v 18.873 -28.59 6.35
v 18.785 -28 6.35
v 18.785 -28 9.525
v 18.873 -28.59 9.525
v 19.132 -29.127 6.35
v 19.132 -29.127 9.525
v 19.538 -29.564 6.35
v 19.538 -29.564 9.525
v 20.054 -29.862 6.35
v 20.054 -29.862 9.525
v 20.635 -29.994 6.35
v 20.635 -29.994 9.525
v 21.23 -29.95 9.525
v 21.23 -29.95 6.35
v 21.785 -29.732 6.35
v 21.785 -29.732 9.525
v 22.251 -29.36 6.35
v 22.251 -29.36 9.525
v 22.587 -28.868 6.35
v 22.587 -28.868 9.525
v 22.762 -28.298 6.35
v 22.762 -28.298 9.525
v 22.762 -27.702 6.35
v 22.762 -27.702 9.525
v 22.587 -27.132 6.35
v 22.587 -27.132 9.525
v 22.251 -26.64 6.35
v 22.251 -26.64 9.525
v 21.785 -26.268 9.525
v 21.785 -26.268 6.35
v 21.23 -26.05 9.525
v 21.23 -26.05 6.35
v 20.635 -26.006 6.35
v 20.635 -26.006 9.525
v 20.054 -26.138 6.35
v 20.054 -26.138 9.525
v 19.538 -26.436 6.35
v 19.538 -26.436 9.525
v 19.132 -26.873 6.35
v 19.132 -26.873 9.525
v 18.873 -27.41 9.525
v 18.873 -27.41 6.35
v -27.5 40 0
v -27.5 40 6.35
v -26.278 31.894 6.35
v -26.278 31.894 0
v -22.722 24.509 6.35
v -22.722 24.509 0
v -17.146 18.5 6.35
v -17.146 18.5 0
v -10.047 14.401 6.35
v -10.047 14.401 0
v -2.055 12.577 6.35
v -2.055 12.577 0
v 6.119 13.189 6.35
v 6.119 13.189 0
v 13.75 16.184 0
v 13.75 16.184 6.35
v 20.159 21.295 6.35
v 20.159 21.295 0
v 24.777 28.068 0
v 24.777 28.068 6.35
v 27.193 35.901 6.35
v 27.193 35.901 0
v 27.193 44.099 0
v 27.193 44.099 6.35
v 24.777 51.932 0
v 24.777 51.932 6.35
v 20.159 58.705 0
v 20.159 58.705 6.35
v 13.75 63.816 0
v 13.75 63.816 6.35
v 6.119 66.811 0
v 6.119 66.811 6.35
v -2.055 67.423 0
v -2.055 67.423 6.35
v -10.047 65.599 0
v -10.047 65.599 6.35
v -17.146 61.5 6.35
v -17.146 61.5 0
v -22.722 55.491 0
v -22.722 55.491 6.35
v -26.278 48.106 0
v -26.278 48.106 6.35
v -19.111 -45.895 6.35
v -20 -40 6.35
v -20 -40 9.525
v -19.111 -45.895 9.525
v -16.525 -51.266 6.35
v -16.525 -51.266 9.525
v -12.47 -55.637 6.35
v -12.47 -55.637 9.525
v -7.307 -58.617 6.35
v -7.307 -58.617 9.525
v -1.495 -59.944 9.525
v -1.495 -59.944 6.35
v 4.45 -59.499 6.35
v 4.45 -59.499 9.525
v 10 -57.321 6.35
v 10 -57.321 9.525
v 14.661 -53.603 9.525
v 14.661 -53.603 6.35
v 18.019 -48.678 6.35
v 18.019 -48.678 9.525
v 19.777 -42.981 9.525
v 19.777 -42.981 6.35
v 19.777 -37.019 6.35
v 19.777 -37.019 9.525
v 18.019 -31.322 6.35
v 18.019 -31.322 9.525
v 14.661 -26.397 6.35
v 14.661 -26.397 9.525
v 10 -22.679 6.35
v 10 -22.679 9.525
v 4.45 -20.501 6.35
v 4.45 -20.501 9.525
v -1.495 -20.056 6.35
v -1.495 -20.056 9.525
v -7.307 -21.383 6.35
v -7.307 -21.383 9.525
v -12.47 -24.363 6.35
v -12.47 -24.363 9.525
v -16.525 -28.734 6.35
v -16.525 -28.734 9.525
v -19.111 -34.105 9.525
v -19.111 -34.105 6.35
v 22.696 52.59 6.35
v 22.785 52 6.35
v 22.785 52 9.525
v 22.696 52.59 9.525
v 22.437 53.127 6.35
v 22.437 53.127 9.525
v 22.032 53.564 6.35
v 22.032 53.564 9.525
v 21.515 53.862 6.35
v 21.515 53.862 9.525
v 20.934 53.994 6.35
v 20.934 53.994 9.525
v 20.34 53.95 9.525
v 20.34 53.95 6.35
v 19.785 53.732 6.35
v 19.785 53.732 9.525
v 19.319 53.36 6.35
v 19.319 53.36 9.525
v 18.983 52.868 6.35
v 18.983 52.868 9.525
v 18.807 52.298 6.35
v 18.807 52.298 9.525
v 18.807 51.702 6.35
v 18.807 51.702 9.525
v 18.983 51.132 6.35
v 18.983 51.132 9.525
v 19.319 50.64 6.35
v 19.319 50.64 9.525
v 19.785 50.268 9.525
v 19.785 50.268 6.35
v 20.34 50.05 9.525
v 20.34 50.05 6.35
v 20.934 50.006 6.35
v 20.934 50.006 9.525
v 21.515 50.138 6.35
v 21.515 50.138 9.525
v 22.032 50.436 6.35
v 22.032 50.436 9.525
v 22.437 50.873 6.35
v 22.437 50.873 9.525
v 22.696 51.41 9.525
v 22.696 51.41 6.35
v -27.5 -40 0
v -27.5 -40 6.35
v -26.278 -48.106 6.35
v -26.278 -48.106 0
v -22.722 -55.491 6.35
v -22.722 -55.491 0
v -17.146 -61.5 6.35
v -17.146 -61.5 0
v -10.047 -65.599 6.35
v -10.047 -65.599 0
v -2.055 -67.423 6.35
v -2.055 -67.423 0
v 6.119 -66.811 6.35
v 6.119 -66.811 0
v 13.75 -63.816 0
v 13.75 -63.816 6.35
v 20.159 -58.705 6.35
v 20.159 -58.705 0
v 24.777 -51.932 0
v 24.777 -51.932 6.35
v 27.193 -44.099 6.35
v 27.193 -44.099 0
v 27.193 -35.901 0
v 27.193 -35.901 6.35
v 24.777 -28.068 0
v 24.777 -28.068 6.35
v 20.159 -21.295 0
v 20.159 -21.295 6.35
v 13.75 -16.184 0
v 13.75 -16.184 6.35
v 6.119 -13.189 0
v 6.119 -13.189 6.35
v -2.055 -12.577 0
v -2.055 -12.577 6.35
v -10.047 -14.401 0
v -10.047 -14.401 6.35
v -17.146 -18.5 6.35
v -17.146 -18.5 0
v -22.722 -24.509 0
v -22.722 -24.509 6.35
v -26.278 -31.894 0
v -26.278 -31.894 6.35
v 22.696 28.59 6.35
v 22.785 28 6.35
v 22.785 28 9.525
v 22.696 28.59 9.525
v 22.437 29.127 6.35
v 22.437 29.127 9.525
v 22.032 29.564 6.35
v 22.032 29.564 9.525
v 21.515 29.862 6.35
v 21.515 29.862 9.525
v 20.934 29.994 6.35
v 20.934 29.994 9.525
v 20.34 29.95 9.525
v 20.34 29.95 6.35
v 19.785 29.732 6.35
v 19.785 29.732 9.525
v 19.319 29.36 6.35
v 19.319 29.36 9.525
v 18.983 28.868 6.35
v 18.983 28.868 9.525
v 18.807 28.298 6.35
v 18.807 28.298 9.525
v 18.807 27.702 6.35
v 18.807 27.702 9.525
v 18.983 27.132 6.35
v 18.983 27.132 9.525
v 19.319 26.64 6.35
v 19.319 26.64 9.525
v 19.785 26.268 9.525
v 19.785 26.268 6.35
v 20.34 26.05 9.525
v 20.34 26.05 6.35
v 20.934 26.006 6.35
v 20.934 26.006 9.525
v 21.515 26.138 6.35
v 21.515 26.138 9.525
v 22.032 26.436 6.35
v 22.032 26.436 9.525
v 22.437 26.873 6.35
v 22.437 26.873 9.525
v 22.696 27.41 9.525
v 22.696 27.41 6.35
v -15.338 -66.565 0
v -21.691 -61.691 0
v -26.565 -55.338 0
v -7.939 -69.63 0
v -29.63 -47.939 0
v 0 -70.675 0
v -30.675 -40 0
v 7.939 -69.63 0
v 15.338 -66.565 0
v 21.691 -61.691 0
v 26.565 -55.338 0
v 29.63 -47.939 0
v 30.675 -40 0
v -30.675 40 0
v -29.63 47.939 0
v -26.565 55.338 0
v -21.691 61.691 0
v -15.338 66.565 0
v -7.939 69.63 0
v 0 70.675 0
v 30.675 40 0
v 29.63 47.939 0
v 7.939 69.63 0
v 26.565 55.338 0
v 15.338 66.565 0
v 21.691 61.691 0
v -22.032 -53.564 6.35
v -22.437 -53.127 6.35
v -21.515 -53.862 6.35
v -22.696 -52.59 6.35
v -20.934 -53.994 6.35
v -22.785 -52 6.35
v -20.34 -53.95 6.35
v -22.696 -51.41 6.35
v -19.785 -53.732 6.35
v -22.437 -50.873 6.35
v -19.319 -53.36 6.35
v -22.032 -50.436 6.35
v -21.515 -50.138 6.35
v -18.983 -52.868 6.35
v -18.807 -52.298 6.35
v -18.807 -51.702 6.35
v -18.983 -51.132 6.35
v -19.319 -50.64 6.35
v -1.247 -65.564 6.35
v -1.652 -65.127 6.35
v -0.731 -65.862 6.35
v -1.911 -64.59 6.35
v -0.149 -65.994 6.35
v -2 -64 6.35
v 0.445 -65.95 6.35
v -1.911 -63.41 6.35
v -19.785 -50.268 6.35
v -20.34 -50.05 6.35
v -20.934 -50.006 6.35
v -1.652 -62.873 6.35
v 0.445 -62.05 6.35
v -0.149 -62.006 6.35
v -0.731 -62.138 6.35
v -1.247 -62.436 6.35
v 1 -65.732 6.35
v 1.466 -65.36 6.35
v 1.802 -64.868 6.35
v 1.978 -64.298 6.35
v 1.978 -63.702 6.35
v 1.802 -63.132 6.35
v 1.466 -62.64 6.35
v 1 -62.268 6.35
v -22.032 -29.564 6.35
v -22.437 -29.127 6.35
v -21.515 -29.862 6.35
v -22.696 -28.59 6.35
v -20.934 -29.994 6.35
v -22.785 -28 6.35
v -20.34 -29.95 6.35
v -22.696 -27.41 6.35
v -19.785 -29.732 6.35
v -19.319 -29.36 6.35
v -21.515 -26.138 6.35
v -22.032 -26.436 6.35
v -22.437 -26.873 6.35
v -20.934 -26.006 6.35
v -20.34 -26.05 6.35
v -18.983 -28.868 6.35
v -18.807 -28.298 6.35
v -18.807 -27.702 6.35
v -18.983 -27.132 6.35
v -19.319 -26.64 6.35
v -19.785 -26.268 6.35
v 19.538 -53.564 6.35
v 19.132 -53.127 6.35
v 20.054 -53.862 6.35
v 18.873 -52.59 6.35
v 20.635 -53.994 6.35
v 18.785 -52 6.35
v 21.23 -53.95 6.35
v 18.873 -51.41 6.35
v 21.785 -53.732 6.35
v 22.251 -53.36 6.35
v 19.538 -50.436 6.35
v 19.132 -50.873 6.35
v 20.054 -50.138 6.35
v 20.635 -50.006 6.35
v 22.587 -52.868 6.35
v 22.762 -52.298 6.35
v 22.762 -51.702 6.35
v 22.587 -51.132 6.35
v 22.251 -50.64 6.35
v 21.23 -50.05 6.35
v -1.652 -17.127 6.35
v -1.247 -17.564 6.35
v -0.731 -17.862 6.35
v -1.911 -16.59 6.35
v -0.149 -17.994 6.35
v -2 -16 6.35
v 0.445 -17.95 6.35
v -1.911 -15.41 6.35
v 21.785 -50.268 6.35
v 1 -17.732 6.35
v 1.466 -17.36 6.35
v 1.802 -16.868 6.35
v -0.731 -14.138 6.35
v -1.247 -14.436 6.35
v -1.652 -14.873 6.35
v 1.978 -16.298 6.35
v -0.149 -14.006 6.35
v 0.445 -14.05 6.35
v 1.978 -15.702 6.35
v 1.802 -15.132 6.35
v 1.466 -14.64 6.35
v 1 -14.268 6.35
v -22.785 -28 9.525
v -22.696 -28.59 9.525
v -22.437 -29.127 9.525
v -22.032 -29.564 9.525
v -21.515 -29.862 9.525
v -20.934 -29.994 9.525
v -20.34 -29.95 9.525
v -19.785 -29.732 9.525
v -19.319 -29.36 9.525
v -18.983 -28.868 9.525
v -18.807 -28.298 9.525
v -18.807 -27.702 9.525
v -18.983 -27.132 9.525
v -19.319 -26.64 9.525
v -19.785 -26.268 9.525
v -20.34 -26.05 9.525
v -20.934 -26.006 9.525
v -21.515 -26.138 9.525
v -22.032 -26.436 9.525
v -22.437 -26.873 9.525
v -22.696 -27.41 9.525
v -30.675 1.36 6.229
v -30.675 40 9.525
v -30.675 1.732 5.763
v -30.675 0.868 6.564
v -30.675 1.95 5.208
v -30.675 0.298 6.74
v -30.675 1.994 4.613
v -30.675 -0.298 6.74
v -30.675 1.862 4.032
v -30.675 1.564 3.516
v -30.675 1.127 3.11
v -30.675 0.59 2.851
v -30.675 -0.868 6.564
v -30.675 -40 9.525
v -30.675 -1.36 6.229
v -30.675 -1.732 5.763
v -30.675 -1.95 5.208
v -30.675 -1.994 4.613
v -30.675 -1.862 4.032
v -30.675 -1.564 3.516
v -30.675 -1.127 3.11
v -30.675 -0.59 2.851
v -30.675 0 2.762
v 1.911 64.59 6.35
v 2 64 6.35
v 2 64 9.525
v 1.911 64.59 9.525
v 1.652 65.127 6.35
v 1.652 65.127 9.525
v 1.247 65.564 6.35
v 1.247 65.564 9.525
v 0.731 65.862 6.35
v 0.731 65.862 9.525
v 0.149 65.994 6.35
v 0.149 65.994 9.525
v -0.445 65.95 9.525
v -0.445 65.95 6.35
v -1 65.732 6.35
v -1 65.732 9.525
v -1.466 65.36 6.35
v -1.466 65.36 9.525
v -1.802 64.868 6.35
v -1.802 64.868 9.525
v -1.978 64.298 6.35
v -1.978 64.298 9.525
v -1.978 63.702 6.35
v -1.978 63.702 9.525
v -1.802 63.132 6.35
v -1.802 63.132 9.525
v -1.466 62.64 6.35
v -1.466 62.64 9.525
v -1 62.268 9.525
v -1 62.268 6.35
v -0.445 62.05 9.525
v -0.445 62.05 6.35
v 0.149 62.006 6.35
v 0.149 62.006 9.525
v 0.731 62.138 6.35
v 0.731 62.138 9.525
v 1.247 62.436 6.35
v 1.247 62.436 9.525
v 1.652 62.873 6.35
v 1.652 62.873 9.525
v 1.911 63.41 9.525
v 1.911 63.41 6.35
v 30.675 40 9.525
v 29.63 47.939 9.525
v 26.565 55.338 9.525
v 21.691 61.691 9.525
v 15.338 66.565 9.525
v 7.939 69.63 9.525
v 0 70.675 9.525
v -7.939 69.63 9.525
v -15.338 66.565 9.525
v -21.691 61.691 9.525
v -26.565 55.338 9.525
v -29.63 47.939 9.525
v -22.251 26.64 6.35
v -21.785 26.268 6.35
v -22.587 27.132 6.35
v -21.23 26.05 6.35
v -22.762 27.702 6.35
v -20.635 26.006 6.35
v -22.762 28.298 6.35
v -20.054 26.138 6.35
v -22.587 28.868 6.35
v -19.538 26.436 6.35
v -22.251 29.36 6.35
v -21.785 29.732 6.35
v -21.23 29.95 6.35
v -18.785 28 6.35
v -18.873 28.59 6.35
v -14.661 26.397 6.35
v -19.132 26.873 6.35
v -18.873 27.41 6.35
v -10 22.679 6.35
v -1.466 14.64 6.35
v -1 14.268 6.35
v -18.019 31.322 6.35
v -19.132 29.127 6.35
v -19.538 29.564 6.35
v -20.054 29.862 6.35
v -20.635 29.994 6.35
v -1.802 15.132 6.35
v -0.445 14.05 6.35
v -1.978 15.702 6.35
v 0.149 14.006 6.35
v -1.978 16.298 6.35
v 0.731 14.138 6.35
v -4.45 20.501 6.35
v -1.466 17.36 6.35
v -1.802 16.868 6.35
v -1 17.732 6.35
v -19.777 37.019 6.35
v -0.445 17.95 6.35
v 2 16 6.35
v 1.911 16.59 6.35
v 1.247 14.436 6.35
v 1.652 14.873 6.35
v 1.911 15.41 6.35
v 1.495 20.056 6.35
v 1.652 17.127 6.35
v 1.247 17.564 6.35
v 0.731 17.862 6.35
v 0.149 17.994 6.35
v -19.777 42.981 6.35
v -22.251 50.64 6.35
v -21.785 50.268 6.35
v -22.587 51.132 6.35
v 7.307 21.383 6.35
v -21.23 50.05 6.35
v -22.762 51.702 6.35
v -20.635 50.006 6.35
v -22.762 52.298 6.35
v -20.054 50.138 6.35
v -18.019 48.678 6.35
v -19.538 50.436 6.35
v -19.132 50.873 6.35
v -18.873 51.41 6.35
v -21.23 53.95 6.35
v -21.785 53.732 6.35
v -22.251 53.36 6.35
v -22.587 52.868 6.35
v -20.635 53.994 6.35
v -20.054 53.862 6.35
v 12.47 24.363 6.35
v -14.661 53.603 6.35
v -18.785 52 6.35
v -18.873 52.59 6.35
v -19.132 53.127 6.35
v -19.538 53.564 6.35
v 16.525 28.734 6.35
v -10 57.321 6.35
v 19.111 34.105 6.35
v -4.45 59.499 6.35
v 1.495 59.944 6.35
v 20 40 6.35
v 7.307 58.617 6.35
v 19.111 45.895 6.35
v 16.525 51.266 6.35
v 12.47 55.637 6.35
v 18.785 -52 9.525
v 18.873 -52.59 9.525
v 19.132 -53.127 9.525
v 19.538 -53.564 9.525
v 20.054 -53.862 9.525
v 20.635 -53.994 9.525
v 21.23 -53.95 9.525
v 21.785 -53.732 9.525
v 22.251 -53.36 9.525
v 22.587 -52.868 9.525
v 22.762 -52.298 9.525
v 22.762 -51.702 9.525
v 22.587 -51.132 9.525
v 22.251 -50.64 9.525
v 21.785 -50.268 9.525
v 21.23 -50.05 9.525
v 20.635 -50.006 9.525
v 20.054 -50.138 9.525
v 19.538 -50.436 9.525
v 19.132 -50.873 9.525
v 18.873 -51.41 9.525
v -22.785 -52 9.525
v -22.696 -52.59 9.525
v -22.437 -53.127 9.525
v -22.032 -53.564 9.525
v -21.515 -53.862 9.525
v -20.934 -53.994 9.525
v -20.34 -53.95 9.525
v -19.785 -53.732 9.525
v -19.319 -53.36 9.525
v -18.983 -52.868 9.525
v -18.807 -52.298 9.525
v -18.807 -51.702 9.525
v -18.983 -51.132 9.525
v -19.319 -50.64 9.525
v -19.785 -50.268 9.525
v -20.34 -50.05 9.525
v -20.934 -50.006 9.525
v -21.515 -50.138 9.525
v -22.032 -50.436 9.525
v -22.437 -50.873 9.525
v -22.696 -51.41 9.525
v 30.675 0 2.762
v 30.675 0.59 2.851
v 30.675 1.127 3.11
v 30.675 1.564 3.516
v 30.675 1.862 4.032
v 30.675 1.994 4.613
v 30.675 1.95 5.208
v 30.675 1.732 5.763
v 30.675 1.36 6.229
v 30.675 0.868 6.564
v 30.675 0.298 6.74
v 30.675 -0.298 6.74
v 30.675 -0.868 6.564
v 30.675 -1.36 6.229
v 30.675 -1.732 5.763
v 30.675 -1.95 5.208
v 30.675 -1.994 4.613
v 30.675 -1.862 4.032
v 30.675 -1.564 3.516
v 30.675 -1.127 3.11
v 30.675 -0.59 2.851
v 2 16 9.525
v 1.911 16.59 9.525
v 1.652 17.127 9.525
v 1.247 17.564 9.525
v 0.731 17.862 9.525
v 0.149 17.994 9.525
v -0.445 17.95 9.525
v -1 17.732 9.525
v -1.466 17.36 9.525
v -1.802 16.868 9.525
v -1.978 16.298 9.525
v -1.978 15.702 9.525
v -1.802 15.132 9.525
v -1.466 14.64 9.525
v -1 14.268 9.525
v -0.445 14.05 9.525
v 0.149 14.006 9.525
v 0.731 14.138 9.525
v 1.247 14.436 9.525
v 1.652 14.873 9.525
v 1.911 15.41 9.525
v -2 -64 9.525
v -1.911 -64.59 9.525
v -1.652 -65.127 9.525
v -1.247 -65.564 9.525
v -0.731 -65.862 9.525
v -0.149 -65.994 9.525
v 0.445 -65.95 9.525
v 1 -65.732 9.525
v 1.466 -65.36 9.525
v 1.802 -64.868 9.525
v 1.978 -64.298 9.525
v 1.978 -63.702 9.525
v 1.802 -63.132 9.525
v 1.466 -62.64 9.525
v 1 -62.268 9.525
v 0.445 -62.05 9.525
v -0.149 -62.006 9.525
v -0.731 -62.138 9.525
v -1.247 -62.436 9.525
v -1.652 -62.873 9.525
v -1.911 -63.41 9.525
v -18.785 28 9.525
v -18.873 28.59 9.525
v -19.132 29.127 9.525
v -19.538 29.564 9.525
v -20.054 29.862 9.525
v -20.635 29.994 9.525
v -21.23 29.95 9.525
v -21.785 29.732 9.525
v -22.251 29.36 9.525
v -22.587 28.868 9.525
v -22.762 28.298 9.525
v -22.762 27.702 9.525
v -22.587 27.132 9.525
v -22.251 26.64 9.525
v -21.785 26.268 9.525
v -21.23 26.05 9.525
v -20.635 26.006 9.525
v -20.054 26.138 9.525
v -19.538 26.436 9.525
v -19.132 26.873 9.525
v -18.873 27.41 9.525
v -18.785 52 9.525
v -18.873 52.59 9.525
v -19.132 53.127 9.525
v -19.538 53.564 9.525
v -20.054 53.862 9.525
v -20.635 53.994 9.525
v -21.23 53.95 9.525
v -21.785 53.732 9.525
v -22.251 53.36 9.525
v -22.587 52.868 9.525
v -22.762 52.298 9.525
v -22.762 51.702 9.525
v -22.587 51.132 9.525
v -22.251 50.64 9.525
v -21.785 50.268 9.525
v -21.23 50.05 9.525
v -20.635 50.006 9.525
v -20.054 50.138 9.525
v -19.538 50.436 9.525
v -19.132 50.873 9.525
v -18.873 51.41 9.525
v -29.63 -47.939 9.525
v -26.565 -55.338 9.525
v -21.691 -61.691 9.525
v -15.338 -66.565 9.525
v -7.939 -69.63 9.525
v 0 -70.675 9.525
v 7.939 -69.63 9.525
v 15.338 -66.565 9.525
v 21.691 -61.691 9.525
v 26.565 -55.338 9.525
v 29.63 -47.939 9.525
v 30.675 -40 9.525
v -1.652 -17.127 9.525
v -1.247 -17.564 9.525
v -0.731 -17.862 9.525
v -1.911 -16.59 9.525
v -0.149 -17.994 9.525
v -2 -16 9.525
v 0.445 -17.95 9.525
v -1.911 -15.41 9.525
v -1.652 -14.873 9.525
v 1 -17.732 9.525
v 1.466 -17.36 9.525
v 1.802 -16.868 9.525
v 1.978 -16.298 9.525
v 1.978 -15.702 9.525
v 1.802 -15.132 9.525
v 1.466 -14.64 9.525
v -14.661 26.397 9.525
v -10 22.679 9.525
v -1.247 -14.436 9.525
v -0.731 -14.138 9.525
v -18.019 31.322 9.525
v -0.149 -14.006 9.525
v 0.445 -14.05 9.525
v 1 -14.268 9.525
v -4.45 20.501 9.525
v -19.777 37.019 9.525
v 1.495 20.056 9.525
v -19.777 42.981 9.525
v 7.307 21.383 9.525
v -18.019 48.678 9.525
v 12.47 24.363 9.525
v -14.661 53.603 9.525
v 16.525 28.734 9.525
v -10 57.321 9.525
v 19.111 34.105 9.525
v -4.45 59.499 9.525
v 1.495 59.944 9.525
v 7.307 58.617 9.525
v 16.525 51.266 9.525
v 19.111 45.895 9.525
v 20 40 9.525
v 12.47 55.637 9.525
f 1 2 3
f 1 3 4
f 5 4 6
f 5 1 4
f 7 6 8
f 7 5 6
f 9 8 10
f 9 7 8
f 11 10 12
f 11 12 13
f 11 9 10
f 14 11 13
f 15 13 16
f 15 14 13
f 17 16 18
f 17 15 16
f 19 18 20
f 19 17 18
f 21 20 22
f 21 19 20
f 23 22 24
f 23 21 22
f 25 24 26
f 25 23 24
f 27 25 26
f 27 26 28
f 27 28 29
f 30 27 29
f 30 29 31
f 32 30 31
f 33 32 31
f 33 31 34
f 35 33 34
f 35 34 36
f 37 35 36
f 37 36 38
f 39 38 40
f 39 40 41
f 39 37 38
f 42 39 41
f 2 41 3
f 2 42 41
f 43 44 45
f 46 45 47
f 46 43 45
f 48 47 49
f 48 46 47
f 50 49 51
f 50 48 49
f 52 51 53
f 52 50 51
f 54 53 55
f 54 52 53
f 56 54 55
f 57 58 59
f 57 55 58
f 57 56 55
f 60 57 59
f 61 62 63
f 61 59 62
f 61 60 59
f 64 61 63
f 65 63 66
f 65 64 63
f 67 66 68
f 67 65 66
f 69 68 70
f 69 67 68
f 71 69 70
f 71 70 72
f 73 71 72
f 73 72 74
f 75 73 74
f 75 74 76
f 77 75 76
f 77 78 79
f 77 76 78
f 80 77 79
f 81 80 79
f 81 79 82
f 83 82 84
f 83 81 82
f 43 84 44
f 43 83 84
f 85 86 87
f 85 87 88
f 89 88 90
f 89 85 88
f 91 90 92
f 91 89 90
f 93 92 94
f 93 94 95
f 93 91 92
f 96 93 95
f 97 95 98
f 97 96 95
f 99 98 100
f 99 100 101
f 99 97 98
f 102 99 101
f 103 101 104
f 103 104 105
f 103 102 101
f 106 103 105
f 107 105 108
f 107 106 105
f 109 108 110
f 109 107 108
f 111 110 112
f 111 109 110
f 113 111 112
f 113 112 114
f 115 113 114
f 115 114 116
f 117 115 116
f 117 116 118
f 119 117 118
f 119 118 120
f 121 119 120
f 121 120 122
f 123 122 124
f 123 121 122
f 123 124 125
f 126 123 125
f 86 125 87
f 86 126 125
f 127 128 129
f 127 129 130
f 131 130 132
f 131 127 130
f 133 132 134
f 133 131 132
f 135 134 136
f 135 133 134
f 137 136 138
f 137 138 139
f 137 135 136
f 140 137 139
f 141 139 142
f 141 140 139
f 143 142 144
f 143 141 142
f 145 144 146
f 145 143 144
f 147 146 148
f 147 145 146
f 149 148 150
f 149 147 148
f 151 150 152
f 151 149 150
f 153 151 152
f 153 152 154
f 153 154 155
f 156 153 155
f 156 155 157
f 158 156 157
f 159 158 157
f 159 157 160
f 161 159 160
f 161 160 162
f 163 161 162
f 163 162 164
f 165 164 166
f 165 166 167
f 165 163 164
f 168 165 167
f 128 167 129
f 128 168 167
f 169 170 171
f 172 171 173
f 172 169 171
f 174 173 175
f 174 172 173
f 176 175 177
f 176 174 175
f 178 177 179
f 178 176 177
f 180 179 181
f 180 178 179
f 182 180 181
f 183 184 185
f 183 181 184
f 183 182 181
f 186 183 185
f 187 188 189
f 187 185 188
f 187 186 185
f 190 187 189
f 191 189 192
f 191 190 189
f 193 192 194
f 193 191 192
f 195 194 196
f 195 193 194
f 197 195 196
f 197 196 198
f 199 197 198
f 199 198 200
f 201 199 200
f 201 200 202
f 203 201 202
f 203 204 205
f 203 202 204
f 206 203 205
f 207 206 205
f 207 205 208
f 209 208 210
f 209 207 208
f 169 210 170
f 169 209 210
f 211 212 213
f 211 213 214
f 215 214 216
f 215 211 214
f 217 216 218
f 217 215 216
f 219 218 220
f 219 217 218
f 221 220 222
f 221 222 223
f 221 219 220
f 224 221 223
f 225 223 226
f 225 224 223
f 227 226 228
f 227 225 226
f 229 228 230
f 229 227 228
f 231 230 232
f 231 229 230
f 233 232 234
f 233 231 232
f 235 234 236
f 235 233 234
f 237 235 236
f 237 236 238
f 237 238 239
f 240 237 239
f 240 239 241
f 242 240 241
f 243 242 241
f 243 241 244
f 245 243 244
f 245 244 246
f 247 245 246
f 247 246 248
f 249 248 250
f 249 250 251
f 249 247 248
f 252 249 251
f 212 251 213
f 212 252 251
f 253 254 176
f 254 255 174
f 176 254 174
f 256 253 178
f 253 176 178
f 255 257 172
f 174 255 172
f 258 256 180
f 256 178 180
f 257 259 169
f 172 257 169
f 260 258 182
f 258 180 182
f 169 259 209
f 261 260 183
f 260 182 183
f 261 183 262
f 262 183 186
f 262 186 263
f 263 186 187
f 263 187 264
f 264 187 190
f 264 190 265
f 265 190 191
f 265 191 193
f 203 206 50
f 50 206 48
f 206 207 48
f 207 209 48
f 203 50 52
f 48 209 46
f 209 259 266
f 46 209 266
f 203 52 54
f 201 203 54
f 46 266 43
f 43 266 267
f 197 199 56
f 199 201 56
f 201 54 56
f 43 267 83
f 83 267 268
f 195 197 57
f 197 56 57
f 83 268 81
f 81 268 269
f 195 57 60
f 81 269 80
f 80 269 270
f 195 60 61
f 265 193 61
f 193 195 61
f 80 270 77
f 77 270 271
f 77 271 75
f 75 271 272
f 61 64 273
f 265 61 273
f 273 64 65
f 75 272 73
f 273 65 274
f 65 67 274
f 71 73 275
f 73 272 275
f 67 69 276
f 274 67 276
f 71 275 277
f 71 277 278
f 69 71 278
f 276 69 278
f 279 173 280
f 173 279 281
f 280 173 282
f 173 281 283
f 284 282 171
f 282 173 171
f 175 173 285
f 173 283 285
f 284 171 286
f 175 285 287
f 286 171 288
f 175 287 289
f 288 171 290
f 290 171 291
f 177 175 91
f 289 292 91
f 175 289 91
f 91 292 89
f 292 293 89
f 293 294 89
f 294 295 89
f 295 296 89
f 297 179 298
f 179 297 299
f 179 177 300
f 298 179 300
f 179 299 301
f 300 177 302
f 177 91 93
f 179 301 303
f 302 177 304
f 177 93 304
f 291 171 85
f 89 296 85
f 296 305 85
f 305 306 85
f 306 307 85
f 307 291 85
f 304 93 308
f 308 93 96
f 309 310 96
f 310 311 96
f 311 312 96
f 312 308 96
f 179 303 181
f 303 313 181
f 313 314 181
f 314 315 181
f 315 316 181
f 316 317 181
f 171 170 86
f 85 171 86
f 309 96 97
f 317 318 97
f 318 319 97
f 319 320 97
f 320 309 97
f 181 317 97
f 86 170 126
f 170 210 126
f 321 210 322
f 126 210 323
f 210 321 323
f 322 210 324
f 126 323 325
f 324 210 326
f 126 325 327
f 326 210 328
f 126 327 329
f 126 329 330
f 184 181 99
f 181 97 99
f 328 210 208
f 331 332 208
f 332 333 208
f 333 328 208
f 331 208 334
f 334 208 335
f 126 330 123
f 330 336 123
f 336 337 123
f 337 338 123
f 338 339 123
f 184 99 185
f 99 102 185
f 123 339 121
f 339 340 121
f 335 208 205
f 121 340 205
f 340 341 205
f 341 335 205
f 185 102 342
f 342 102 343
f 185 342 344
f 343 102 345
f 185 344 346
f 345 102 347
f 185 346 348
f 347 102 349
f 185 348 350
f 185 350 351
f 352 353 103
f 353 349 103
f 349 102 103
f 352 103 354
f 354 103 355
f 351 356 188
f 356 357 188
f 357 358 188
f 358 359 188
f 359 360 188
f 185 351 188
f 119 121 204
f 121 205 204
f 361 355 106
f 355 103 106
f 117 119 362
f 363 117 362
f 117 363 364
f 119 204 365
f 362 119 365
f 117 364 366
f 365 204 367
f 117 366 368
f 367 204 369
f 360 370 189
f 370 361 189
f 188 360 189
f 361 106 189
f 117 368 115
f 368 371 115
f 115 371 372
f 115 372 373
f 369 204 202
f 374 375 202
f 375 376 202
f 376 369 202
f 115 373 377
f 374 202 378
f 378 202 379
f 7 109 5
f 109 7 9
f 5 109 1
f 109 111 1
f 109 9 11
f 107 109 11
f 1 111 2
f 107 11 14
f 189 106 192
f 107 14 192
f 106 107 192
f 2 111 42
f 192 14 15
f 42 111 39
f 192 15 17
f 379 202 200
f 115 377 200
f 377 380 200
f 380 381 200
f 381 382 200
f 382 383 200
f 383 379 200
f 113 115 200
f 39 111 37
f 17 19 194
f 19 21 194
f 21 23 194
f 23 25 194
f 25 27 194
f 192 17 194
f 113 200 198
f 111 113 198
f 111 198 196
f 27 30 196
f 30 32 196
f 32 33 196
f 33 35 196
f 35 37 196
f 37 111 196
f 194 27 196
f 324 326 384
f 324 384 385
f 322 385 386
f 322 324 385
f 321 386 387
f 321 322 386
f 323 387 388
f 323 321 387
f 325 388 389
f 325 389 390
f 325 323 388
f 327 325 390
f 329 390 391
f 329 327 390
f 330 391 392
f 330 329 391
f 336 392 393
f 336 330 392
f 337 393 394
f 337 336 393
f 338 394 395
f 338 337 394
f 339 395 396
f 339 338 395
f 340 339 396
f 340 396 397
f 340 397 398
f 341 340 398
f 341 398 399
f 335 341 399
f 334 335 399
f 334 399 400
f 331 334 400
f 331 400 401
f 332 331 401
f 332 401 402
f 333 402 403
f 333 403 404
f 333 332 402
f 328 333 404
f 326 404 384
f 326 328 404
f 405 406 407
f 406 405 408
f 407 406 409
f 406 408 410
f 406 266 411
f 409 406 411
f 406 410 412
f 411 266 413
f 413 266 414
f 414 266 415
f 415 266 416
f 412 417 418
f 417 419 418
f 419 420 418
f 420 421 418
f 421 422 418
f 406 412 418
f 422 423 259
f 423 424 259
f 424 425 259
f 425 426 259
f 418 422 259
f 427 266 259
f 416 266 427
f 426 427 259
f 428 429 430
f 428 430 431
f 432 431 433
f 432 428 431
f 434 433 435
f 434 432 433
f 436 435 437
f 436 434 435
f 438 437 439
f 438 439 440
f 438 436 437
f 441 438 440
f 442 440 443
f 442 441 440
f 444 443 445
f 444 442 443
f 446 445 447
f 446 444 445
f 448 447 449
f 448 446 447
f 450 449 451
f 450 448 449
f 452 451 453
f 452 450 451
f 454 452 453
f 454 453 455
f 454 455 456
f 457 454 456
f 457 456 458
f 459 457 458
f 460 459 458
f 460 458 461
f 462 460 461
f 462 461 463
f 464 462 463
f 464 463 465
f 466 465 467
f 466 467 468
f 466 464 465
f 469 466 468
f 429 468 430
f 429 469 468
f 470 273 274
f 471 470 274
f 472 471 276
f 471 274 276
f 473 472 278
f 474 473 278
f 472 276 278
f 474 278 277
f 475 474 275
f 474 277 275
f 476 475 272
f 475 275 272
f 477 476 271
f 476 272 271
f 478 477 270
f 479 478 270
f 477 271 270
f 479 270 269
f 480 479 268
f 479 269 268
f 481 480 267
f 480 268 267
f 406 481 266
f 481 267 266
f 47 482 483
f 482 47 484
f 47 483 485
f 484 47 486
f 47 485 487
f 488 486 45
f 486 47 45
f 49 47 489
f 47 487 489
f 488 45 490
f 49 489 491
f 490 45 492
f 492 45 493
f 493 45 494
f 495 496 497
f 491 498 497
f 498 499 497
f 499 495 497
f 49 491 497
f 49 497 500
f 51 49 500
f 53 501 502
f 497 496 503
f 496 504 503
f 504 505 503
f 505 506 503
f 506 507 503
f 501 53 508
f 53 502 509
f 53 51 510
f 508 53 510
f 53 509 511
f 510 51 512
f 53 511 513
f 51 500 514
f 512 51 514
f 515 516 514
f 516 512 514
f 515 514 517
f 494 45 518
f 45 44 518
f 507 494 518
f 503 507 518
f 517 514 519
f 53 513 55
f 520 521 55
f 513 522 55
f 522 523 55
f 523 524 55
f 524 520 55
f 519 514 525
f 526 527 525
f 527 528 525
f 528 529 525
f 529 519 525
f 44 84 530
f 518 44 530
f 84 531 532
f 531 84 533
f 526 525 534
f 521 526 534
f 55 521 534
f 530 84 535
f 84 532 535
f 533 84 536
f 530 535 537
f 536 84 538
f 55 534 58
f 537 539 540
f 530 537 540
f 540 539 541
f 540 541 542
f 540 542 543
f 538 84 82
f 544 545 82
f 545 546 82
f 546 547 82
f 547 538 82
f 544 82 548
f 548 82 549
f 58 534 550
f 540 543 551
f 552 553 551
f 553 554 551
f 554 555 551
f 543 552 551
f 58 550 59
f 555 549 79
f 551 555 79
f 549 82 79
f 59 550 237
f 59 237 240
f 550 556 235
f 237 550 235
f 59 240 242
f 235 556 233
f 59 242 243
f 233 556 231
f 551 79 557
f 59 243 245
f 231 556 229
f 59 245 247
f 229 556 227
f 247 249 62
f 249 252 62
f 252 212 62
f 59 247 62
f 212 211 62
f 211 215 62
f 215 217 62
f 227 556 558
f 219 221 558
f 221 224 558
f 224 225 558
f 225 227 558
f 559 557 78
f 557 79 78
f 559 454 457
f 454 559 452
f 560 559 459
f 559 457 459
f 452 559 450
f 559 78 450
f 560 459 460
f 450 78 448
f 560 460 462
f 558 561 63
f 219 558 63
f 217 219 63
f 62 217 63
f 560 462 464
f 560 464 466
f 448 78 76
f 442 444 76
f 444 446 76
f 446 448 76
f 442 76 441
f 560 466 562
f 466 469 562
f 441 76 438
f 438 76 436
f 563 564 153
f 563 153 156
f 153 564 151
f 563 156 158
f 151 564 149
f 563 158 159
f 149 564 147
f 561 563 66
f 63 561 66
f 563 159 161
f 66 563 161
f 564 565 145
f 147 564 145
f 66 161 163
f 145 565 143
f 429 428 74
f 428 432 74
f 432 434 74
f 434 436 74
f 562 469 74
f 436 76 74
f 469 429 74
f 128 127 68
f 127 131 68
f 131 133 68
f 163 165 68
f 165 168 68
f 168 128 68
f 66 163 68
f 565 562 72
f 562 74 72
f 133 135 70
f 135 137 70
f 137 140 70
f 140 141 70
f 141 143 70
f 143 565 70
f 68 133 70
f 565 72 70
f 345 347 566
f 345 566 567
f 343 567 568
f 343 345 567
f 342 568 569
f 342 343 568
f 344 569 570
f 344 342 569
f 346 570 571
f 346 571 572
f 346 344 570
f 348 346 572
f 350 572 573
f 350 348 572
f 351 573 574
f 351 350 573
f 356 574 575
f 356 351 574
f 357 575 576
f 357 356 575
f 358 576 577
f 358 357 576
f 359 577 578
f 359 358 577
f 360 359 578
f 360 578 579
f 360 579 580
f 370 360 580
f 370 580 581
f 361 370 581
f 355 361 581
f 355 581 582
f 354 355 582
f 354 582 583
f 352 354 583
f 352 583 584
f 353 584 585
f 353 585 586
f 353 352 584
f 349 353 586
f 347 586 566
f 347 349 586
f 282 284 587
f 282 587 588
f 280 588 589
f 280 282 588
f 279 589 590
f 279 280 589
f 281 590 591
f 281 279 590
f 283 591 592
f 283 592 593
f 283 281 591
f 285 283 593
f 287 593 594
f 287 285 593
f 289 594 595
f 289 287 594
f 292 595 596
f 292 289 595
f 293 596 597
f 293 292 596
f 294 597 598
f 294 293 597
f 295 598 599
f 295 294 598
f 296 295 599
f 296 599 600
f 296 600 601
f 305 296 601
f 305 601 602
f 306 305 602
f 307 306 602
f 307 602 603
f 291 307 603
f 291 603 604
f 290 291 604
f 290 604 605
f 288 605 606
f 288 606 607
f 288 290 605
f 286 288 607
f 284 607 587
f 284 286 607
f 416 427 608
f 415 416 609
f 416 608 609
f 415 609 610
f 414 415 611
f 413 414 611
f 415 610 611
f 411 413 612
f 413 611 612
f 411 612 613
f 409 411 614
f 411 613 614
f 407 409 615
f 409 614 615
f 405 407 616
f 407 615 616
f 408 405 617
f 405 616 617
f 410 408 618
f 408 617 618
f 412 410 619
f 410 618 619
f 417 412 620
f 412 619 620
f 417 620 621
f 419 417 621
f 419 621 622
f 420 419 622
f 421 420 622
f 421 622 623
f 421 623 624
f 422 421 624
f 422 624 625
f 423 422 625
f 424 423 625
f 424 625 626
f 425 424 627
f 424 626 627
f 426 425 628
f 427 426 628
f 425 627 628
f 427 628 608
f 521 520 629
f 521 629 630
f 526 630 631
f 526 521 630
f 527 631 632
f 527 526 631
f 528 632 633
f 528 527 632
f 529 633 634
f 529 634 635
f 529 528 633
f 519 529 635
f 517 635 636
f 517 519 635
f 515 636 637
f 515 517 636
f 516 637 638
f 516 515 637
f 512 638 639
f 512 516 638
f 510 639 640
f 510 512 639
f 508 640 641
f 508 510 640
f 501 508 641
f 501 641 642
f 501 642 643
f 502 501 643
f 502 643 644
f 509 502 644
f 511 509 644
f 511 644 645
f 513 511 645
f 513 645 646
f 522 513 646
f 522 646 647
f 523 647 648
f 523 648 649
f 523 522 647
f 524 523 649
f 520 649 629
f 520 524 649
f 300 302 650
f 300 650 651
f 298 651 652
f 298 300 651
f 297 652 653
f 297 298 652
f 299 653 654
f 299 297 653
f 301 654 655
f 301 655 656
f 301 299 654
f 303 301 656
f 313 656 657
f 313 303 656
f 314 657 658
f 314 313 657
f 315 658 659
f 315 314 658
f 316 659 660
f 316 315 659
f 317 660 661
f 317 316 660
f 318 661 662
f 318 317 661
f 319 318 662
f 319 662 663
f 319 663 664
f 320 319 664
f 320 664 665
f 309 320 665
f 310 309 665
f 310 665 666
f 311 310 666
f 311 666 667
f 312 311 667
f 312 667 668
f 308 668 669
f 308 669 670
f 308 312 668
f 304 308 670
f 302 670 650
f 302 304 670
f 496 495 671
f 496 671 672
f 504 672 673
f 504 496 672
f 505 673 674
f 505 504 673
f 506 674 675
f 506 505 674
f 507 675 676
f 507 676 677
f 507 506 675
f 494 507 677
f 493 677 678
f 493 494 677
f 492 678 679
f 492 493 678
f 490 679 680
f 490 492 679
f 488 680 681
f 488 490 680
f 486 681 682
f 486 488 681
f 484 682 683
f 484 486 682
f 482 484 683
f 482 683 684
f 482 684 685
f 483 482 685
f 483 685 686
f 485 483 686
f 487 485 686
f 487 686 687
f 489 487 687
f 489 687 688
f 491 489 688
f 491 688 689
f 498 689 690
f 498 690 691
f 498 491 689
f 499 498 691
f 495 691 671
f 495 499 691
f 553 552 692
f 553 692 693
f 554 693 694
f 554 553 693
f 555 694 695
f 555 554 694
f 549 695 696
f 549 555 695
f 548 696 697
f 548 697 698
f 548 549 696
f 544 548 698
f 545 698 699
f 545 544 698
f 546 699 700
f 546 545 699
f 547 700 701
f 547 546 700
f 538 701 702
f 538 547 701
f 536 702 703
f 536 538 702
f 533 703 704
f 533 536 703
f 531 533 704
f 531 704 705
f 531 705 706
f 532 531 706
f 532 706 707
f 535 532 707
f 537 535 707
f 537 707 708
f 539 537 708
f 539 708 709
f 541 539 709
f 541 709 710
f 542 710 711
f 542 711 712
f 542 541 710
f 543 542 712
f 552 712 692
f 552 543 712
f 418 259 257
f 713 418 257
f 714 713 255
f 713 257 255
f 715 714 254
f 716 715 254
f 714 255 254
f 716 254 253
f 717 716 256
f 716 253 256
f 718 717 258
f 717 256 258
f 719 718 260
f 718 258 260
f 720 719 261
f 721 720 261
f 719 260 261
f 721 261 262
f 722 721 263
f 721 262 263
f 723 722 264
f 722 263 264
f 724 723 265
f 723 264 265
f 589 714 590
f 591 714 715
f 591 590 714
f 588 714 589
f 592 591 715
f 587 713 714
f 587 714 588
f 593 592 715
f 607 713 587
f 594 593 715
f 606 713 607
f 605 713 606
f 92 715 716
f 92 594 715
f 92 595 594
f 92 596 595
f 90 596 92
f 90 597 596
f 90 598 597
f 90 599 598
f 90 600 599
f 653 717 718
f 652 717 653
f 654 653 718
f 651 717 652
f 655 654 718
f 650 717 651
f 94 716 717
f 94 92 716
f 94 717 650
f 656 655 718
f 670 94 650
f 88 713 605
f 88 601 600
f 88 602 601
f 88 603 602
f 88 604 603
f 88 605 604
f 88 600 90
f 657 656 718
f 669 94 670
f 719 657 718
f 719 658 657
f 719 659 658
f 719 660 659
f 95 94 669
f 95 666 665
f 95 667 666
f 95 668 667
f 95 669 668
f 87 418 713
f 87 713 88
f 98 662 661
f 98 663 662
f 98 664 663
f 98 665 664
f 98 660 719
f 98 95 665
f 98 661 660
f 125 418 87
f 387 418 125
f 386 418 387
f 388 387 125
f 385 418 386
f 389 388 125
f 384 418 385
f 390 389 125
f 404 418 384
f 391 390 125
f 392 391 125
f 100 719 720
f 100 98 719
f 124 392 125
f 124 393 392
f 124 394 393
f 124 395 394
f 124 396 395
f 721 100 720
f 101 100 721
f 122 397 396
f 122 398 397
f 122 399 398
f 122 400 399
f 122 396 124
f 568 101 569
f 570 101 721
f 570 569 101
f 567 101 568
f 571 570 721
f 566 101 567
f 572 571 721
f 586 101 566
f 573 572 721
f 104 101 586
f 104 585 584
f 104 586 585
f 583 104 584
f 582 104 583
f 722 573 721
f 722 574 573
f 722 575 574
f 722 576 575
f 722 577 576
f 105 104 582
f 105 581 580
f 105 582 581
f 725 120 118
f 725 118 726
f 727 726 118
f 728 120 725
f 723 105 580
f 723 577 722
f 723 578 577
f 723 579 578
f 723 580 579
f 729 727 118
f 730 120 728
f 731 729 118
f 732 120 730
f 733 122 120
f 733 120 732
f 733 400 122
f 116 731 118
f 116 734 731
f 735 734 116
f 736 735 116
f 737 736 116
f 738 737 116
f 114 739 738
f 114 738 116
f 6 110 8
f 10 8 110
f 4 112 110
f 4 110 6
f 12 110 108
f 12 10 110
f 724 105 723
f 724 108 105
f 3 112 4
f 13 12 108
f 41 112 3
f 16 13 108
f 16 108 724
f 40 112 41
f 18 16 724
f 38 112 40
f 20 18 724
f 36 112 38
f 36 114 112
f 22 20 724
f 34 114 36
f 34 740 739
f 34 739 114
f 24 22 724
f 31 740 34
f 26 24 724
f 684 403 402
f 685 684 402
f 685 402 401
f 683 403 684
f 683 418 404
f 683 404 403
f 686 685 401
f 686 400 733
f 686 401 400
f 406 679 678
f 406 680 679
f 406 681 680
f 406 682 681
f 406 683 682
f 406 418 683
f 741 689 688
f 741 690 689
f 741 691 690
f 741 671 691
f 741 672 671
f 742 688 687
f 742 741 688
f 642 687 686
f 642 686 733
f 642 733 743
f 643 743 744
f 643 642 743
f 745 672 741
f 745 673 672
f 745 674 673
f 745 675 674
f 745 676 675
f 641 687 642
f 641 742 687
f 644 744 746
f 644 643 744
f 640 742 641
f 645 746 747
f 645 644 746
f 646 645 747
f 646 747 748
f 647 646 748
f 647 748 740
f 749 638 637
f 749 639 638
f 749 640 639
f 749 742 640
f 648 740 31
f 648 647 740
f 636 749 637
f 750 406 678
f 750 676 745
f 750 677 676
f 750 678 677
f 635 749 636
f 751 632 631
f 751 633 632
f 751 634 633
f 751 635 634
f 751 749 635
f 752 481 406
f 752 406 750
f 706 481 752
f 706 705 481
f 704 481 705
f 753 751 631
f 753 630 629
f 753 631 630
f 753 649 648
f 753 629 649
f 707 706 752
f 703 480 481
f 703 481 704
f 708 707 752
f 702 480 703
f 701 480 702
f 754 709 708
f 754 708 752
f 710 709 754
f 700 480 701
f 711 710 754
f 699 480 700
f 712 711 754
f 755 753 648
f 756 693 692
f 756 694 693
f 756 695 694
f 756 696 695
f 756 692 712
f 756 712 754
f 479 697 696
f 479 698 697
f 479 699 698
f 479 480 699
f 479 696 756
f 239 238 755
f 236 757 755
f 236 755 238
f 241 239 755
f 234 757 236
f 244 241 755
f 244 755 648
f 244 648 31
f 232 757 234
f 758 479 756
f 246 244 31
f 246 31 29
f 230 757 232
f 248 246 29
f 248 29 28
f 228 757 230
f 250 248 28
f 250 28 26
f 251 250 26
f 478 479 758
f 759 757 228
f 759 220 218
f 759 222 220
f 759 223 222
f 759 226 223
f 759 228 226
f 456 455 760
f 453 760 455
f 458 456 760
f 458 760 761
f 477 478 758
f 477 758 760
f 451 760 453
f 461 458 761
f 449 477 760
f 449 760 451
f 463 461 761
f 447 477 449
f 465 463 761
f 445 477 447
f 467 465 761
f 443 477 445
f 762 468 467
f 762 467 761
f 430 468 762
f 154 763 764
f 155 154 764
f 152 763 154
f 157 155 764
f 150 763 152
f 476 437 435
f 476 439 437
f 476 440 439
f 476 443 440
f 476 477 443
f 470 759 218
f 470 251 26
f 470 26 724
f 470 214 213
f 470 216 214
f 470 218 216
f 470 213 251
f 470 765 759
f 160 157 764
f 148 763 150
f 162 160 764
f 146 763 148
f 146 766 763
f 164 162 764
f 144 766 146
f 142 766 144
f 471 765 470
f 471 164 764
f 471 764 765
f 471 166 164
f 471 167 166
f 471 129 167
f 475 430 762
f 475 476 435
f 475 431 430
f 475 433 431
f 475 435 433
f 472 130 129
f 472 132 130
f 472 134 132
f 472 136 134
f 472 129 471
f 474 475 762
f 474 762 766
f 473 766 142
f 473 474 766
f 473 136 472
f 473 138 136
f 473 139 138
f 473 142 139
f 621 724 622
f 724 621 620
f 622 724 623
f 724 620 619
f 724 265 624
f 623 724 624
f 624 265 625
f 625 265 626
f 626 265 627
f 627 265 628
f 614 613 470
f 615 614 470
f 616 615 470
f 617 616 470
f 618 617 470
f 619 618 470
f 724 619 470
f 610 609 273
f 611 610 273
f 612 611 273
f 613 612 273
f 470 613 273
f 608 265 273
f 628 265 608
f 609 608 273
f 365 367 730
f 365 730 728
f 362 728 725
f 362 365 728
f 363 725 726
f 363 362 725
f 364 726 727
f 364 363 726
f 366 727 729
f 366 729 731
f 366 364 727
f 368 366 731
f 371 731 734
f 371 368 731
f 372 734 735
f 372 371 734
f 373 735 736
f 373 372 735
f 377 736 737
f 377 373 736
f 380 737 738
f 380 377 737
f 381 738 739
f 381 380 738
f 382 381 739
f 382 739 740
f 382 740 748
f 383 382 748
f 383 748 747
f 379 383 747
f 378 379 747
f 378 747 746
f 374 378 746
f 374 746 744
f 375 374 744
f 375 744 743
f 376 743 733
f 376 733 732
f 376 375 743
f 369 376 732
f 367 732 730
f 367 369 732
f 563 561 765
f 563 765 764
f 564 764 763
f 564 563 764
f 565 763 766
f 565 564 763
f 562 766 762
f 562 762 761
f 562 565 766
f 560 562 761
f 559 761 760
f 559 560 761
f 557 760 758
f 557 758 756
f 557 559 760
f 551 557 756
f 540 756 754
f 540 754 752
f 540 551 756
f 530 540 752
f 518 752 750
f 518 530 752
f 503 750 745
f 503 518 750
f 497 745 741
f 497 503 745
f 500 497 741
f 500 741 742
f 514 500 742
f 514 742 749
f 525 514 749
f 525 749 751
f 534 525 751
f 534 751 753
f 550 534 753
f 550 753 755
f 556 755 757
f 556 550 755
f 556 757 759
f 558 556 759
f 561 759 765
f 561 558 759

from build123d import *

# Parameters (mm, degrees)
SKETCH1_R           = 27.5
BOSS_EXTRUDE1_DEPTH = 9.525
BOSS_EXTRUDE2_START = -3.175
SKETCH2_R           = 20
SKETCH2_R_2         = 2
BOSS_EXTRUDE2_DEPTH = 3.175
SKETCH8_R           = 2
CUT_EXTRUDE6_DEPTH  = 52.5


with BuildPart() as part:
    # Sketch1 → Boss-Extrude1 (new body)
    with BuildSketch(Plane.XY):
        with BuildLine():
            Line((-30.675000233, 40), (-30.675000233, -40))
            ThreePointArc((-30.675000233, -40), (0, -70.675000233), (30.675000233, -40))
            Line((30.675000233, -40), (30.675000233, 40))
            ThreePointArc((30.675000233, 40), (0, 70.675000233), (-30.675000233, 40))
        make_face()
        with Locations(Location((0, 40, 0), (0, 0, 180))):
            Circle(SKETCH1_R, mode=Mode.SUBTRACT)
        with Locations(Location((0, -40, 0), (0, 0, 180))):
            Circle(SKETCH1_R, mode=Mode.SUBTRACT)
    extrude(amount=BOSS_EXTRUDE1_DEPTH)

    # Sketch2 → Boss-Extrude2 (add)
    with BuildSketch(Plane.XY.offset(9.525).offset(BOSS_EXTRUDE2_START)):
        with BuildLine():
            Line((-30.675000233, 40), (-30.675000233, -40))
            ThreePointArc((-30.675000233, -40), (0, -70.675000233), (30.675000233, -40))
            Line((30.675000233, -40), (30.675000233, 40))
            ThreePointArc((30.675000233, 40), (0, 70.675000233), (-30.675000233, 40))
        make_face()
        with Locations((0, 40)):
            Circle(SKETCH2_R, mode=Mode.SUBTRACT)
        with Locations((0, 64)):
            Circle(SKETCH2_R_2, mode=Mode.SUBTRACT)
        with Locations((20.784609691, 52)):
            Circle(SKETCH2_R_2, mode=Mode.SUBTRACT)
        with Locations((20.784609691, 28)):
            Circle(SKETCH2_R_2, mode=Mode.SUBTRACT)
        with Locations((0, 16)):
            Circle(SKETCH2_R_2, mode=Mode.SUBTRACT)
        with Locations((-20.784609691, 28)):
            Circle(SKETCH2_R_2, mode=Mode.SUBTRACT)
        with Locations((-20.784609691, 52)):
            Circle(SKETCH2_R_2, mode=Mode.SUBTRACT)
        with Locations(Location((-20.784609691, -52, 0), (0, 0, 180))):
            Circle(SKETCH2_R_2, mode=Mode.SUBTRACT)
        with Locations(Location((-20.784609691, -28, 0), (0, 0, 180))):
            Circle(SKETCH2_R_2, mode=Mode.SUBTRACT)
        with Locations(Location((0, -16, 0), (0, 0, 180))):
            Circle(SKETCH2_R_2, mode=Mode.SUBTRACT)
        with Locations(Location((20.784609691, -28, 0), (0, 0, 180))):
            Circle(SKETCH2_R_2, mode=Mode.SUBTRACT)
        with Locations(Location((20.784609691, -52, 0), (0, 0, 180))):
            Circle(SKETCH2_R_2, mode=Mode.SUBTRACT)
        with Locations(Location((0, -64, 0), (0, 0, 180))):
            Circle(SKETCH2_R_2, mode=Mode.SUBTRACT)
        with Locations(Location((0, -40, 0), (0, 0, 180))):
            Circle(SKETCH2_R, mode=Mode.SUBTRACT)
    extrude(amount=BOSS_EXTRUDE2_DEPTH)

    # Sketch8 → Cut-Extrude6 (cut, symmetric)
    with BuildSketch(Plane(origin=(0, 0, 0), x_dir=(0, 0, -1), z_dir=(1, 0, 0))):
        with Locations((-4.7625, 0)):
            Circle(SKETCH8_R)
    extrude(amount=CUT_EXTRUDE6_DEPTH, both=True, mode=Mode.SUBTRACT)


solid = part.part
